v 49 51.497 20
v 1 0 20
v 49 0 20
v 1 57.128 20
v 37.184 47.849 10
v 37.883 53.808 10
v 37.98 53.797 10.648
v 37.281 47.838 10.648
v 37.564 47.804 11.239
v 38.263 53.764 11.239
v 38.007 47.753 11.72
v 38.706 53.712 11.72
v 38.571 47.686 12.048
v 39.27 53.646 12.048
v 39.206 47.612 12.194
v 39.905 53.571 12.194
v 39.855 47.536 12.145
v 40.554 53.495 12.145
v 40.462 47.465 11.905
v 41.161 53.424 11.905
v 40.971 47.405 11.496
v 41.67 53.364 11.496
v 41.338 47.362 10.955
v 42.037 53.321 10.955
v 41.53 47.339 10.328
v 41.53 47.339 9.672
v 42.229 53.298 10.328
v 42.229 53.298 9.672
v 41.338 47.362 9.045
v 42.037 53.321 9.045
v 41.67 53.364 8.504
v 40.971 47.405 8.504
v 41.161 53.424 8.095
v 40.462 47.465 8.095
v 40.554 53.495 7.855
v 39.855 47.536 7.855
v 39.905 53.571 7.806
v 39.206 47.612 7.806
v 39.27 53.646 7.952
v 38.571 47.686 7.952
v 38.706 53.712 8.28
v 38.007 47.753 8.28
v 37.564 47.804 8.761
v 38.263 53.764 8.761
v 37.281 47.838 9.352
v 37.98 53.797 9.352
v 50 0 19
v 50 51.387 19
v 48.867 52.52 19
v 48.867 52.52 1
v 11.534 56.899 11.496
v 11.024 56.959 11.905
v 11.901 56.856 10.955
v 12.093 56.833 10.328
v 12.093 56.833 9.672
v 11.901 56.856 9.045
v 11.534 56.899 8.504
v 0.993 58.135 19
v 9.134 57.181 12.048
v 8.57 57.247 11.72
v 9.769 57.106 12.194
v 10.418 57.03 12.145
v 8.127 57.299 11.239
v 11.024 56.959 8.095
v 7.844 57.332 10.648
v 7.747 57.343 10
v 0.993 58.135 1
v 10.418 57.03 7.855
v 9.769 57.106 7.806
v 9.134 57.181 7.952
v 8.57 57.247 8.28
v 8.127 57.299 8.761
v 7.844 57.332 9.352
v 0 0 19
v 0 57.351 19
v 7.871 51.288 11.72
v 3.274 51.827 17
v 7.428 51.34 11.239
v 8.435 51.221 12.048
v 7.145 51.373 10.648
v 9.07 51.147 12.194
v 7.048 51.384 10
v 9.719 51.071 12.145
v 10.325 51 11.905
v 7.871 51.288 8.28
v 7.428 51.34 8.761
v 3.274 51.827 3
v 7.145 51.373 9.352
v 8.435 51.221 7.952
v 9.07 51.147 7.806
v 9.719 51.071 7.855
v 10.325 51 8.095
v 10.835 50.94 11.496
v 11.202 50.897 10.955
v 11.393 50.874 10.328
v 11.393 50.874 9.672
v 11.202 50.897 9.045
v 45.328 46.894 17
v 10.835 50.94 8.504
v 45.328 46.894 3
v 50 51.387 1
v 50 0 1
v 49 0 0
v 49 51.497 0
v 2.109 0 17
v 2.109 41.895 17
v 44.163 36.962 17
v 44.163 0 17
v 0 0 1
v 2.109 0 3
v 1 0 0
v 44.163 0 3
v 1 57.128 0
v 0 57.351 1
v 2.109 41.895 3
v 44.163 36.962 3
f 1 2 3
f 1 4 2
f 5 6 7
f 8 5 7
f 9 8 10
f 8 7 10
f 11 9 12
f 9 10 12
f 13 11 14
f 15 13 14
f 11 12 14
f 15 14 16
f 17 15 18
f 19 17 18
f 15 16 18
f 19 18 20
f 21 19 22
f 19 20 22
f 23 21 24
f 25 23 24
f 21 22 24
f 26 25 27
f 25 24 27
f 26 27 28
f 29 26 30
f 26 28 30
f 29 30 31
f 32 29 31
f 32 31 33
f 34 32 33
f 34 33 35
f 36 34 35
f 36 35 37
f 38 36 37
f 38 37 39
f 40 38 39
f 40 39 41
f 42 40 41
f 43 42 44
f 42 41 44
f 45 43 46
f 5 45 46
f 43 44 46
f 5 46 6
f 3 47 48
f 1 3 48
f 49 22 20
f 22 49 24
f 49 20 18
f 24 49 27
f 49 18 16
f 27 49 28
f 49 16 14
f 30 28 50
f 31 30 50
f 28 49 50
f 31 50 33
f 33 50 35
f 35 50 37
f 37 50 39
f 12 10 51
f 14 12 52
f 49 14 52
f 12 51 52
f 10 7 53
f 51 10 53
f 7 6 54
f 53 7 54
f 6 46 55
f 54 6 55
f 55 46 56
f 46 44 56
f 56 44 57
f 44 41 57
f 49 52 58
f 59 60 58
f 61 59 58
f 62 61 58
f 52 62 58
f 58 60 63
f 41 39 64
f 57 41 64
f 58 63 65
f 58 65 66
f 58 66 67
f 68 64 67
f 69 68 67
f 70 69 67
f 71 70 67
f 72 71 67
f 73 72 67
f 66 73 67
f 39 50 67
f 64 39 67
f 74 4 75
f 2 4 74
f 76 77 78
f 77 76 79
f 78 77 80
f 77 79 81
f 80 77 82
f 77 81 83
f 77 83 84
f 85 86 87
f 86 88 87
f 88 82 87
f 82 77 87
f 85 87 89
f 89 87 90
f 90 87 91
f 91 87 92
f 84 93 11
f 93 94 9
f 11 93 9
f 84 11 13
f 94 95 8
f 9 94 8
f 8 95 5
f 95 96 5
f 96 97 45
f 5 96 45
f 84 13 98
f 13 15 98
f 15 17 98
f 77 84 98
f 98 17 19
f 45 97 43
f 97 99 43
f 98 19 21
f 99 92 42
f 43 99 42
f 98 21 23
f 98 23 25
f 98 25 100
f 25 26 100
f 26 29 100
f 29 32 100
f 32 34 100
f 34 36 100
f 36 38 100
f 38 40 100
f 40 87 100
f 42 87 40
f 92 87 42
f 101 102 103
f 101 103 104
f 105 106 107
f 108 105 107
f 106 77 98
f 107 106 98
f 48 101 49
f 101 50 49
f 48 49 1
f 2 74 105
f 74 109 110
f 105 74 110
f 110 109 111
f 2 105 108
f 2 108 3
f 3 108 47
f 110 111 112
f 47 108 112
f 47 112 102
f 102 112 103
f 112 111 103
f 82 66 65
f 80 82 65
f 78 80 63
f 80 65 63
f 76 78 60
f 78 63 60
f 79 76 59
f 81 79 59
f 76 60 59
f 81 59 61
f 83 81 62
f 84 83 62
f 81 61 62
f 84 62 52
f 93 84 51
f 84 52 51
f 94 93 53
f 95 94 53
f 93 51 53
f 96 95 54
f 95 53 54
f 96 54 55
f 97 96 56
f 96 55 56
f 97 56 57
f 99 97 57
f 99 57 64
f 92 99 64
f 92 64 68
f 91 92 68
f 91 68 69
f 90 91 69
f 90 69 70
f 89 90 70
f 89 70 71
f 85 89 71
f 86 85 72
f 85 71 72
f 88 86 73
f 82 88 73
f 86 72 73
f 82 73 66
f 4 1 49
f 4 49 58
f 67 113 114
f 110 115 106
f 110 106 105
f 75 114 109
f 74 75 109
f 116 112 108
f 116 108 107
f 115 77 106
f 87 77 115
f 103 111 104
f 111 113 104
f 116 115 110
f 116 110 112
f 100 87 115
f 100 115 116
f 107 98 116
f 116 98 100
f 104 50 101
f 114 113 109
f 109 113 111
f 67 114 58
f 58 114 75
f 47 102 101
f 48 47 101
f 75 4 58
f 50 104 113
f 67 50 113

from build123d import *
from OCP.BRepFilletAPI import BRepFilletAPI_MakeChamfer

# Parameters (mm, degrees)
BOSS_EXTRUDE1_DEPTH = 20
SKETCH3_W           = 42.34282297
SKETCH3_H           = 14
CUT_EXTRUDE1_DEPTH  = 10
CUT_EXTRUDE2_DEPTH  = 14
SKETCH2_R           = 2.2
CUT_EXTRUDE3_DEPTH  = 6
CHAMFER1_SIZE       = 1
CHAMFER1_SIZE2      = 0.9011492
CHAMFER1_SIZE2_2    = 1.140658854


with BuildPart() as part:
    # Sketch1 → Boss-Extrude1 (new body)
    with BuildSketch(Plane.XY):
        Polygon((0, 58.251961434), (0, 0), (50, 0), (50, 52.38682507), align=None)
    extrude(amount=BOSS_EXTRUDE1_DEPTH)

    # Sketch3 → Cut-Extrude1 (cut)
    with BuildSketch(Plane(origin=(6.041343432, 51.502156617, 0), x_dir=(0.9931902315046269, -0.11650392286865593, 0), z_dir=(0.11650392286865592, 0.9931902315046268, 0))):
        with Locations((18.384829463, -10)):
            Rectangle(SKETCH3_W, SKETCH3_H)
    extrude(amount=-CUT_EXTRUDE1_DEPTH, mode=Mode.SUBTRACT)

    # Sketch4 → Cut-Extrude2 (cut)
    with BuildSketch(Plane.XY.offset(3)):
        Polygon((2.10869816, 41.894902039), (2.10869816, 0), (44.163176308, 0), (44.163176308, 36.961797057), align=None)
    extrude(amount=CUT_EXTRUDE2_DEPTH, mode=Mode.SUBTRACT)

    # Sketch2 → Cut-Extrude3 (cut)
    with BuildSketch(Plane(origin=(6.740366969, 57.461298006, 0), x_dir=(0.9931902315046269, -0.11650392286865593, 0), z_dir=(0.11650392286865592, 0.9931902315046268, 0))):
        with Locations(Location((3.213417978, -10, 0), (0, 0, 180))):
            Circle(SKETCH2_R)
        with Locations(Location((33.556240948, -10, 0), (0, 0, 180))):
            Circle(SKETCH2_R)
    extrude(amount=-CUT_EXTRUDE3_DEPTH, mode=Mode.SUBTRACT)

    # Chamfer1: one chamfer whose edges measure the first distance from different faces: ONE call of the kernel's chamfer builder (chamfer() names one face for all edges)
    chamfer1_edges_1 = [part.edges().sort_by_distance(p)[0] for p in [
        (25, 55.319393252, 20),
        (0, 29.125980717, 20),
        (0, 29.125980717, 0),
        (25, 55.319393252, 0),
        (50, 26.193412535, 0),
        (50, 26.193412535, 20),
    ]]
    chamfer1_edges_2 = [part.edges().sort_by_distance(p)[0] for p in [
        (0, 58.251961434, 10),
    ]]
    chamfer1_side_2 = [part.faces().sort_by_distance(p)[0] for p in [
        (25, 55.319393252, 10),
    ]]
    chamfer1_edges_3 = [part.edges().sort_by_distance(p)[0] for p in [
        (50, 52.38682507, 10),
    ]]
    chamfer1_side_3 = [part.faces().sort_by_distance(p)[0] for p in [
        (50, 26.193412535, 10),
    ]]
    chamfer1 = BRepFilletAPI_MakeChamfer(part.part.solid().wrapped)
    for e in chamfer1_edges_1:
        chamfer1.Add(CHAMFER1_SIZE, e.wrapped)
    for e in chamfer1_edges_2:
        chamfer1.Add(CHAMFER1_SIZE, CHAMFER1_SIZE2, e.wrapped, chamfer1_side_2[0].wrapped)  # the first distance lies on this face
    for e in chamfer1_edges_3:
        chamfer1.Add(CHAMFER1_SIZE, CHAMFER1_SIZE2_2, e.wrapped, chamfer1_side_3[0].wrapped)  # the first distance lies on this face
    add(Compound.cast(chamfer1.Shape()), mode=Mode.REPLACE)


solid = part.part
